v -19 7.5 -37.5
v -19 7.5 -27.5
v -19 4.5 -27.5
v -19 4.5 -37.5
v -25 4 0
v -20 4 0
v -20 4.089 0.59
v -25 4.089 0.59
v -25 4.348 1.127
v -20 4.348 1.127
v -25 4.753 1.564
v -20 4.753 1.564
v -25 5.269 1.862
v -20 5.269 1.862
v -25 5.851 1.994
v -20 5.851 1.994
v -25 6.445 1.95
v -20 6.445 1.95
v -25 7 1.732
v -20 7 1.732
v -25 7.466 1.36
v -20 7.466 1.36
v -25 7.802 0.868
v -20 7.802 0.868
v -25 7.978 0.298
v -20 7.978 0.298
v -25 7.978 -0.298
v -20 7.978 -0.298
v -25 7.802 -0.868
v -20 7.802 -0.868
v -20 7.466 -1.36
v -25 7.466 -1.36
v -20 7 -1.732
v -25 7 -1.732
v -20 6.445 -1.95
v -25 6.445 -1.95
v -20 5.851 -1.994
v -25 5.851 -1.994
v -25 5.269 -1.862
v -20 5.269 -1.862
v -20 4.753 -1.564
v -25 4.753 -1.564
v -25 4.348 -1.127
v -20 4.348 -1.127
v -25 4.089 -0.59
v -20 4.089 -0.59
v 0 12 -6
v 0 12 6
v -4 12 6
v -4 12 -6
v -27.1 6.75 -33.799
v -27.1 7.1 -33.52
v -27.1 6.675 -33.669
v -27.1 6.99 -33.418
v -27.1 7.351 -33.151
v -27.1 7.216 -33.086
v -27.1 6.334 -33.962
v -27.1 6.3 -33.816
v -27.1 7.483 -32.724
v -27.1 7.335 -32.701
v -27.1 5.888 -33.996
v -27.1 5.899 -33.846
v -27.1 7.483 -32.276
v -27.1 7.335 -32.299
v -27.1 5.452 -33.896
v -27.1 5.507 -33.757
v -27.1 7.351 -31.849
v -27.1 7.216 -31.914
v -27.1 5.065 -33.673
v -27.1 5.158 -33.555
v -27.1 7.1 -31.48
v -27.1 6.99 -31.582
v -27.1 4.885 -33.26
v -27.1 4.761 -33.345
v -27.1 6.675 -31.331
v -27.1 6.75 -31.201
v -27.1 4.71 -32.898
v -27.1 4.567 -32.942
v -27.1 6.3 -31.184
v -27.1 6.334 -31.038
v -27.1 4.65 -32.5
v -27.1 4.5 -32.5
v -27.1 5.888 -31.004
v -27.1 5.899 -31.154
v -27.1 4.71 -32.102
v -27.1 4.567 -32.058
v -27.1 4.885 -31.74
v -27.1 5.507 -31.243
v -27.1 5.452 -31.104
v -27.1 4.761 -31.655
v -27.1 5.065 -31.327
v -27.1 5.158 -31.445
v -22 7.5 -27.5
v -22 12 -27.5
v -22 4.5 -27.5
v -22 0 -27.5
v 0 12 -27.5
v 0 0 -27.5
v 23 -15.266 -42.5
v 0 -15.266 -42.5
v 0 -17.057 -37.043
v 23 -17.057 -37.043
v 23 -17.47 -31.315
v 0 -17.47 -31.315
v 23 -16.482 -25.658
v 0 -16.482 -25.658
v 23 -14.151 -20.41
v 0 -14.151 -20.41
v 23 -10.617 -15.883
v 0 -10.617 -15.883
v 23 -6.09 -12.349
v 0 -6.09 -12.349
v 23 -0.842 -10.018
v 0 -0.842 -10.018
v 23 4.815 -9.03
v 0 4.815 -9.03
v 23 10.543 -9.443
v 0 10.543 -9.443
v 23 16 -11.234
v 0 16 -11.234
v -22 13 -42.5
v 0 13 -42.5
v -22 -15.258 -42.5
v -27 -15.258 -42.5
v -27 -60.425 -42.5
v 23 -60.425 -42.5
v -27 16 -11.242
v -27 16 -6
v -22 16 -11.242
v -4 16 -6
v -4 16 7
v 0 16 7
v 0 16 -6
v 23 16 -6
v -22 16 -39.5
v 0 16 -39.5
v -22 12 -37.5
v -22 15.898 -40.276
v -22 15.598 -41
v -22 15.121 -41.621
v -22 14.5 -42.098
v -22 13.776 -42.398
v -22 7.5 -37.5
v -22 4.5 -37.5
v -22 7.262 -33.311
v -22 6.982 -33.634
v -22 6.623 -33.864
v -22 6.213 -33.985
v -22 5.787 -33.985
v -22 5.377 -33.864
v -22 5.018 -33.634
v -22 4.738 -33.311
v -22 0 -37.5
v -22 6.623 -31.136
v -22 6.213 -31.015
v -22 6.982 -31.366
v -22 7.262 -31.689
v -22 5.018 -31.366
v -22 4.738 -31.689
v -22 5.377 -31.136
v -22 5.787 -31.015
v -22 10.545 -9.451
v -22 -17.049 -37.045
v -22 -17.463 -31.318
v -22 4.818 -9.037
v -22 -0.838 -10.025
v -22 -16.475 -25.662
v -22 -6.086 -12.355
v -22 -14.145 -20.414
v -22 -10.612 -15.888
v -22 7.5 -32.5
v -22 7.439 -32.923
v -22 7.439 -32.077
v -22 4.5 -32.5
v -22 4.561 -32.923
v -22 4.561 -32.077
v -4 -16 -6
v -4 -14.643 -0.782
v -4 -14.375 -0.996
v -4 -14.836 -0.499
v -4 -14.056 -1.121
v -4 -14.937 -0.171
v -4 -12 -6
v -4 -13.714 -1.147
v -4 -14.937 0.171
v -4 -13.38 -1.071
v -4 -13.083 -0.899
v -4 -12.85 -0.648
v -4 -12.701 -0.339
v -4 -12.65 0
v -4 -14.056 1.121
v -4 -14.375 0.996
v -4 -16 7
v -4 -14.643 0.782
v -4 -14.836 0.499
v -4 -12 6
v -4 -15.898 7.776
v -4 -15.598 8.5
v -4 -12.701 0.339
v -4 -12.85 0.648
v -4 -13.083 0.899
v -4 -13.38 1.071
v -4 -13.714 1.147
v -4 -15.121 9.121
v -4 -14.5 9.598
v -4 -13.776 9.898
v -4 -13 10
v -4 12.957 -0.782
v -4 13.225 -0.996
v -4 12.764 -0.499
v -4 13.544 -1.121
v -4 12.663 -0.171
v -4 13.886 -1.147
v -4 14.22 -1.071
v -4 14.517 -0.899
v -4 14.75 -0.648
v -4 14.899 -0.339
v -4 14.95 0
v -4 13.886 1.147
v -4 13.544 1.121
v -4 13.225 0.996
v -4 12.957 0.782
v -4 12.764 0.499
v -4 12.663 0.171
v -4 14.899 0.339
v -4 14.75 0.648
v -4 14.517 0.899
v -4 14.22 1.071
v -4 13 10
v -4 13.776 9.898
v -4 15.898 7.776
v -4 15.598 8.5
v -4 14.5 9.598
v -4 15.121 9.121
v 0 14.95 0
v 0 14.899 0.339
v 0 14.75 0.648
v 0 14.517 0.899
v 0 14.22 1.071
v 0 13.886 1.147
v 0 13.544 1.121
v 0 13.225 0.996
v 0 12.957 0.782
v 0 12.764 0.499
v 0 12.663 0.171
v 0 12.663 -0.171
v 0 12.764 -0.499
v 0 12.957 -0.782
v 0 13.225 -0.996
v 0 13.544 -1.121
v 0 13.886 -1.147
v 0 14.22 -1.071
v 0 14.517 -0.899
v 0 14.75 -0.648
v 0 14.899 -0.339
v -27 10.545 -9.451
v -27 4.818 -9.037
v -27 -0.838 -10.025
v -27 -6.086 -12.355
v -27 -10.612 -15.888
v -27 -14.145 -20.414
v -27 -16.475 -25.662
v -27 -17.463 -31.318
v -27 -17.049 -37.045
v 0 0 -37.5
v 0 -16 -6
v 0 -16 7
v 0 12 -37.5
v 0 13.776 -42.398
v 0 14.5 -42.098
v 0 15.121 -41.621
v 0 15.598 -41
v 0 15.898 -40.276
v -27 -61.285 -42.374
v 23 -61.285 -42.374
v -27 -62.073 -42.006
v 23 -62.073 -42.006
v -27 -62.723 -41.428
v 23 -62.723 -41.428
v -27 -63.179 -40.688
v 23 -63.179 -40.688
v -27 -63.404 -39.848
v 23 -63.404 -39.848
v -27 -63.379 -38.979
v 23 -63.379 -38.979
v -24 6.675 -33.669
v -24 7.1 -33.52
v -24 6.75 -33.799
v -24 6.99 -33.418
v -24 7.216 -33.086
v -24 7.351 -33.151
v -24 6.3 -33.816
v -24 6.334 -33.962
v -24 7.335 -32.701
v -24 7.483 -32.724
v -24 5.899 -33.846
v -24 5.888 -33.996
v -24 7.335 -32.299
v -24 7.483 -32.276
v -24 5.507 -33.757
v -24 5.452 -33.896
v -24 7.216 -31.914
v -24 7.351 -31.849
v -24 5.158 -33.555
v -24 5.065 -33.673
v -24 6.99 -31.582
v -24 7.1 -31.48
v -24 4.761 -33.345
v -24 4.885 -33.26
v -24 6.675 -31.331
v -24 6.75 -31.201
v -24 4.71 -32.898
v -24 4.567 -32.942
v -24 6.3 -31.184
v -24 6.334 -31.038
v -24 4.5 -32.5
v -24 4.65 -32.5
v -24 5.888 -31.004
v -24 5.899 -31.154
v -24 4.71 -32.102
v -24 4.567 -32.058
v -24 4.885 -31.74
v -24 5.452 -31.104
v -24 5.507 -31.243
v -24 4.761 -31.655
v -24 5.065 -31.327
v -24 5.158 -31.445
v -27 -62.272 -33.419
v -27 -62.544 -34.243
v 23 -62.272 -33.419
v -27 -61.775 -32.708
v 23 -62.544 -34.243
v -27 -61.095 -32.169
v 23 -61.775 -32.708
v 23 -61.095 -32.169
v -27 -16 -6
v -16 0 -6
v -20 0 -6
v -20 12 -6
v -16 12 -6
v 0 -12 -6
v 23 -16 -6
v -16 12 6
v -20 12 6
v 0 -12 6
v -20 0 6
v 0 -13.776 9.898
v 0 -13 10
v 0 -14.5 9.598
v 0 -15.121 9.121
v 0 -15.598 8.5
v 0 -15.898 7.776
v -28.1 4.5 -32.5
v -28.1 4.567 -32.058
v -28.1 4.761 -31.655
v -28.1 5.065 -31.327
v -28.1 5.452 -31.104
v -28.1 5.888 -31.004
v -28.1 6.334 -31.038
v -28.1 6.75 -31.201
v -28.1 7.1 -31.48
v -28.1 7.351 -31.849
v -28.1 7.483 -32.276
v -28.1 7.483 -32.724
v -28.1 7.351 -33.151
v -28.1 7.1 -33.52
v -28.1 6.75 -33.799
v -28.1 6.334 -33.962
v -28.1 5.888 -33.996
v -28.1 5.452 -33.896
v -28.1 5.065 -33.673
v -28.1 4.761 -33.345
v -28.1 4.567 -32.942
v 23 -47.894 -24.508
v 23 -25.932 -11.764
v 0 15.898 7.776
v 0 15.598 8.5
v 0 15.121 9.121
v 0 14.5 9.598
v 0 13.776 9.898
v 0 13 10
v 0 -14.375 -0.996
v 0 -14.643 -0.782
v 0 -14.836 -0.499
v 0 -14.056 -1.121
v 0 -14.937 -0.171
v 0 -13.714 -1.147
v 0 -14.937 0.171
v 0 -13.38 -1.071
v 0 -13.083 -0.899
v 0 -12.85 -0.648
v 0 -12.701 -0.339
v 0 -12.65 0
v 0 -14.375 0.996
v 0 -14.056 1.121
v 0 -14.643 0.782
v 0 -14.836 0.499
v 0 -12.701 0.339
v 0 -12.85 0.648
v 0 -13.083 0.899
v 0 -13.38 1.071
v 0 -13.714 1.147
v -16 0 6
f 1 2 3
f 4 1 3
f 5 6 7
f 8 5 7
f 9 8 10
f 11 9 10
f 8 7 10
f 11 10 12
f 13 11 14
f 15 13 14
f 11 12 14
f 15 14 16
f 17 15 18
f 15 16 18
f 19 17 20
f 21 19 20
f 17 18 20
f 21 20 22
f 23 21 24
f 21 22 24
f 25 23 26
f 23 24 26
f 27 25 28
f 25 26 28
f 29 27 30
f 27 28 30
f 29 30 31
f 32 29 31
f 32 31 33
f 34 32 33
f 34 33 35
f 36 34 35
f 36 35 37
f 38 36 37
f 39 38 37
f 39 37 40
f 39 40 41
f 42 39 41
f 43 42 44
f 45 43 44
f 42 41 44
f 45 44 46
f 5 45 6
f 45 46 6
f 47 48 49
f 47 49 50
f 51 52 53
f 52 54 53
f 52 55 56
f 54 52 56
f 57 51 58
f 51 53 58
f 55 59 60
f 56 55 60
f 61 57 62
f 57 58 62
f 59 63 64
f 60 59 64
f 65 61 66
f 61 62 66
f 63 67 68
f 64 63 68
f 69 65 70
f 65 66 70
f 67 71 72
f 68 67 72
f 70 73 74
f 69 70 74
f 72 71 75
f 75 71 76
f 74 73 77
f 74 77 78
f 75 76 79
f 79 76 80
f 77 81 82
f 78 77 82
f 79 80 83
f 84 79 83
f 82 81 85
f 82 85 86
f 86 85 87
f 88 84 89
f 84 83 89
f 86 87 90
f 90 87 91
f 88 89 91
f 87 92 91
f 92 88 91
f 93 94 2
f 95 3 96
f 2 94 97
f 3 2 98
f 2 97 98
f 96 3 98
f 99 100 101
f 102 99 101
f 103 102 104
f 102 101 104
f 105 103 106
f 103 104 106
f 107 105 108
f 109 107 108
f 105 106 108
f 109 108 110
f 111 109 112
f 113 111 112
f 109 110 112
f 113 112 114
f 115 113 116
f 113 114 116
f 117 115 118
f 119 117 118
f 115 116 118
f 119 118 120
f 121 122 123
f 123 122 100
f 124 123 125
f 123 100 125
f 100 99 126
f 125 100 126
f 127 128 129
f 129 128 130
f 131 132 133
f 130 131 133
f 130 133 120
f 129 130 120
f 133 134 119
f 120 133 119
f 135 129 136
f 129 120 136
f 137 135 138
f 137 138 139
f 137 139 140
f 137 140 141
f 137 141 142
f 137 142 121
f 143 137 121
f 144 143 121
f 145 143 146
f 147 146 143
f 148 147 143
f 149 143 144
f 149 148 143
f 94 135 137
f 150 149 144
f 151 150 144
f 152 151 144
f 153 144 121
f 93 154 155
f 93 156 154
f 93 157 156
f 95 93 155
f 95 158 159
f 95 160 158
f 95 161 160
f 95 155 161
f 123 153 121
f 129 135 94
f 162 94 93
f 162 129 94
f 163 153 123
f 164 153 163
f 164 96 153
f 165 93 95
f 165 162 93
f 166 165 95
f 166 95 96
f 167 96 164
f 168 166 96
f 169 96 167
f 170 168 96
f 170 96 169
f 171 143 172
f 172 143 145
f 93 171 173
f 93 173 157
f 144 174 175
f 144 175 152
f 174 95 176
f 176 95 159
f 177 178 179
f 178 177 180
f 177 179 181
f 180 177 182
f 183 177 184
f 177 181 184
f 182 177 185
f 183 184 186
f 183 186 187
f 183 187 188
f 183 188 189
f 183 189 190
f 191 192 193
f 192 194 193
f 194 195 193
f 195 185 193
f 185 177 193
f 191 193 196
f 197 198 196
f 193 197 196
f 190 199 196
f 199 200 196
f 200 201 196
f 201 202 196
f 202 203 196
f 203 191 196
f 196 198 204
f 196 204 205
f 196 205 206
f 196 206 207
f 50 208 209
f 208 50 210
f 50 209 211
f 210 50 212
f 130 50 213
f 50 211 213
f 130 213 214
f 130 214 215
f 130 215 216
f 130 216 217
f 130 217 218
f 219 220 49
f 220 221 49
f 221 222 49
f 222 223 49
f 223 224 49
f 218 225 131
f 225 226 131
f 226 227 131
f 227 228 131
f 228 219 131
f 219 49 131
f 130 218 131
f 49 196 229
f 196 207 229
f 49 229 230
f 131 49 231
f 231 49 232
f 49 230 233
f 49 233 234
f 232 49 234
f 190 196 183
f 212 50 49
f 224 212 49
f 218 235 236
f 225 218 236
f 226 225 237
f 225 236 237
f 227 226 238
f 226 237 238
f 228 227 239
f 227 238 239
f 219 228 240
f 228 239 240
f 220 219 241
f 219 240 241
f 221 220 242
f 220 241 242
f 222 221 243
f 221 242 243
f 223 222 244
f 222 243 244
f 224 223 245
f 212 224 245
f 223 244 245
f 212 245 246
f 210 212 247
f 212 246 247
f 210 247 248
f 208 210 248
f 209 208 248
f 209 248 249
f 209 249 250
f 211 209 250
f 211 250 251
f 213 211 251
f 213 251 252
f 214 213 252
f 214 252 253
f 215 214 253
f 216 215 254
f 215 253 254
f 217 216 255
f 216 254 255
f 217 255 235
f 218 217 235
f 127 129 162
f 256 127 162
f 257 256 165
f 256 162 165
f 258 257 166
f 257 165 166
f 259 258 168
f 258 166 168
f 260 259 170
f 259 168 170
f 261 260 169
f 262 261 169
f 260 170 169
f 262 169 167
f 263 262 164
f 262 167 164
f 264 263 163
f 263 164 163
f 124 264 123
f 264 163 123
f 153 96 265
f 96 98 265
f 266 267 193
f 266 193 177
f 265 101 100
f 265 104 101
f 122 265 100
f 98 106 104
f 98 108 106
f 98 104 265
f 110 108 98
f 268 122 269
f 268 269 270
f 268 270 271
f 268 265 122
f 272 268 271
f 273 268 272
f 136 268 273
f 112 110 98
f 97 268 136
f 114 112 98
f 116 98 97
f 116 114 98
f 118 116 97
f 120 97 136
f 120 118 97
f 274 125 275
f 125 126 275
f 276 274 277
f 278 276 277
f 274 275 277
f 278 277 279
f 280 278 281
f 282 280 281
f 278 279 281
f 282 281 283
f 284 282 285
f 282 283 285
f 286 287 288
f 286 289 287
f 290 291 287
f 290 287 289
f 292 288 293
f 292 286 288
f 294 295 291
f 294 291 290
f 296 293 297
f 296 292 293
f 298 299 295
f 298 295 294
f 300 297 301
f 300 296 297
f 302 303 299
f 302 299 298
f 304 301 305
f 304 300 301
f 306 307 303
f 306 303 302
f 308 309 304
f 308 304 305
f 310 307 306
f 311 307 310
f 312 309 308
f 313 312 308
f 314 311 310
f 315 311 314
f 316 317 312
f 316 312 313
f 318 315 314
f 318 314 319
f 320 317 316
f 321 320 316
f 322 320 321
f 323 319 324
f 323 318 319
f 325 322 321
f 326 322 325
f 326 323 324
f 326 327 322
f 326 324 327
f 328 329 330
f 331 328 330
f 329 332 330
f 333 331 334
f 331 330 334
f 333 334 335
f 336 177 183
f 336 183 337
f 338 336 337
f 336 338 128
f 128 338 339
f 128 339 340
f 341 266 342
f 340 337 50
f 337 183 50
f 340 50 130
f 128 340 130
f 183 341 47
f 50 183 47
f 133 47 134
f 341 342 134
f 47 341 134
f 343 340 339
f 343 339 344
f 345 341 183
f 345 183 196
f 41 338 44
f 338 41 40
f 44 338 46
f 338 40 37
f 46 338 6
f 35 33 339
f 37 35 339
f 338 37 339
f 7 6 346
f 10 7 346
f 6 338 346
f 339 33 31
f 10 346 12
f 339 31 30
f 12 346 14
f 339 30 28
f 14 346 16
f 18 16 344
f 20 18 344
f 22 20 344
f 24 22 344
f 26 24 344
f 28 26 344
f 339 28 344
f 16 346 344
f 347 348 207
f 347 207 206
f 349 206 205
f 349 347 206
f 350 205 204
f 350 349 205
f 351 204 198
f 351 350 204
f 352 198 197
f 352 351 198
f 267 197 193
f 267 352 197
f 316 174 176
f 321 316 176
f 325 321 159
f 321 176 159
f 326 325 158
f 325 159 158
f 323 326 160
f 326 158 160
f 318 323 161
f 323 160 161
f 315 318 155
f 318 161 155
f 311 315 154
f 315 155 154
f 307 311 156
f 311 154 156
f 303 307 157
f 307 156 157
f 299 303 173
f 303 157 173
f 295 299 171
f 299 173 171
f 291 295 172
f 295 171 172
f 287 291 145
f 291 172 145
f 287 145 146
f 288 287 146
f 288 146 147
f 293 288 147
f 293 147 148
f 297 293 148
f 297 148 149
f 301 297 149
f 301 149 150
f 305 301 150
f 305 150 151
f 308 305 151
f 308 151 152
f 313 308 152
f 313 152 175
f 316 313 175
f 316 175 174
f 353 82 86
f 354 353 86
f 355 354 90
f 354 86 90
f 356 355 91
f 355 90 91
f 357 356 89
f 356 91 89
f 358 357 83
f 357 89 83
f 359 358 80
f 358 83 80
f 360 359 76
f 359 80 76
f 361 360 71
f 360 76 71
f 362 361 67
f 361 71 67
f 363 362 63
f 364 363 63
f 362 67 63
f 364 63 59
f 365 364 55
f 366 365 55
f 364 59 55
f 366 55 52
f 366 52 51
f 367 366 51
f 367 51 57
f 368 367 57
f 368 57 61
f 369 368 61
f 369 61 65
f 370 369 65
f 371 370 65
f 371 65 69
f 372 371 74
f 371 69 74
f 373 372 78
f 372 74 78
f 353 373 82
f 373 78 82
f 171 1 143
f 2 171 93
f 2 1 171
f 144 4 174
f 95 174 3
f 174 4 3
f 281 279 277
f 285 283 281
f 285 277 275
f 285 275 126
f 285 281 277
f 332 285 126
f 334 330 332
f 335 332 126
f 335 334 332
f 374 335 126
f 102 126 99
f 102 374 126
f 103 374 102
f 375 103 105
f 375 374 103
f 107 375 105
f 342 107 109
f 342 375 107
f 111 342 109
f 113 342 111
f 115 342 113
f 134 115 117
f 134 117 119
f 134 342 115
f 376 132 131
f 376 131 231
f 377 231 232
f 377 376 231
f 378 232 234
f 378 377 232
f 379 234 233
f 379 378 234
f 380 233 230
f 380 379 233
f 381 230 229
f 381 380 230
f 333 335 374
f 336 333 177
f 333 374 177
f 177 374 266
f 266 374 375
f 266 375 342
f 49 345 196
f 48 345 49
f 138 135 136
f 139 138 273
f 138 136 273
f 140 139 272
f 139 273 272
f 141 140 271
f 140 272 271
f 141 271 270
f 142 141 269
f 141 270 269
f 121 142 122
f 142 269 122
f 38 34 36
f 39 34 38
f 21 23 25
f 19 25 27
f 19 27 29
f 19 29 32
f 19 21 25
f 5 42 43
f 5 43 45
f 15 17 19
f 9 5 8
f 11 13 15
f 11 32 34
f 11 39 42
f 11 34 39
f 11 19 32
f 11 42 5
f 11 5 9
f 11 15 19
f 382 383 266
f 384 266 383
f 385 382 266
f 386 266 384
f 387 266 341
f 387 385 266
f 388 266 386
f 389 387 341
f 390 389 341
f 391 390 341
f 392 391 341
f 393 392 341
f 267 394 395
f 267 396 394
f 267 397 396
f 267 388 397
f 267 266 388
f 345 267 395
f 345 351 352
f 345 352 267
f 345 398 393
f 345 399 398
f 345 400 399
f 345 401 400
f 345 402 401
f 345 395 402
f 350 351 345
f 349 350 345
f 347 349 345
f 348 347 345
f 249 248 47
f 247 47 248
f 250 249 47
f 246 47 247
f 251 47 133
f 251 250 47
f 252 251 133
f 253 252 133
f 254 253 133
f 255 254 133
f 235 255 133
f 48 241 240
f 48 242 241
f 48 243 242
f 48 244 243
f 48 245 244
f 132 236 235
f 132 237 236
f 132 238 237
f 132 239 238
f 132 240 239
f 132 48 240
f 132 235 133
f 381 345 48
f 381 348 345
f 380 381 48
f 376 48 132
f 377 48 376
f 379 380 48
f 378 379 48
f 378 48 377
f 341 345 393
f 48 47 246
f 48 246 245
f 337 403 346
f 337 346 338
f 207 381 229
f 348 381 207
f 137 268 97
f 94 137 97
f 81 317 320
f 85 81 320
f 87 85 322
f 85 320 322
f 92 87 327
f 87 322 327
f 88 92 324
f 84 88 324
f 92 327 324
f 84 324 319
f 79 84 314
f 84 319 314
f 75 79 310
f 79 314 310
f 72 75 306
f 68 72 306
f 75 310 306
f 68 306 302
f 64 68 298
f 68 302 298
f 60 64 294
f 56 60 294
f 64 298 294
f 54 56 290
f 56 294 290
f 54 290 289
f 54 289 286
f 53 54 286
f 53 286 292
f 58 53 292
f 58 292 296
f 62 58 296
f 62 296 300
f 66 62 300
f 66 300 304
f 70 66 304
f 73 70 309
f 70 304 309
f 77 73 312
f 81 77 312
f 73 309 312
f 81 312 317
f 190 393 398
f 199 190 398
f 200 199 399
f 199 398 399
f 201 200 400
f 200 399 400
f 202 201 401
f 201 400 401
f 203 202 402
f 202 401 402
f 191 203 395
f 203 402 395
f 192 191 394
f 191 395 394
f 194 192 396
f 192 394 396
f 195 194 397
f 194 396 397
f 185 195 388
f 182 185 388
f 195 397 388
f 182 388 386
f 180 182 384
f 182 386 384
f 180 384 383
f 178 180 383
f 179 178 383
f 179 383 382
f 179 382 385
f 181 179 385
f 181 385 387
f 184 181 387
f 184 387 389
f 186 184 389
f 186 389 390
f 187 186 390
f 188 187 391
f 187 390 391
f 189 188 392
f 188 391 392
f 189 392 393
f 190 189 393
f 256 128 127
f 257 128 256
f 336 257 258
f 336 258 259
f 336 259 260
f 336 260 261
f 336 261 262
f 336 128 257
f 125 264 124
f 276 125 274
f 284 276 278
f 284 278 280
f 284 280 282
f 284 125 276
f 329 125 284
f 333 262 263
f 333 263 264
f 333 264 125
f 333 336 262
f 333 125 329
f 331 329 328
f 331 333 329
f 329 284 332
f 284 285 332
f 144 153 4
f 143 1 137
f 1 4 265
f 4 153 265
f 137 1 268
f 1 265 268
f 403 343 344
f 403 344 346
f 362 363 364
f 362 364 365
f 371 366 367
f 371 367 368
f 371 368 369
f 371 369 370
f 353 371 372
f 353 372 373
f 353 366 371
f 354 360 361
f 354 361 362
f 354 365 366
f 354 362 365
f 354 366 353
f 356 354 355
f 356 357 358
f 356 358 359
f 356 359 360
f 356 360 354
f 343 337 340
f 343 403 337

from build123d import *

# Parameters (mm, degrees)
F1_DEPTH  = 23
F0_W      = 12
F0_H      = 10
F2_DEPTH  = 19
F3_W      = 3
F3_H      = 10
F4_DEPTH  = 3
F6_DEPTH  = 2
F7_R      = 1.35
F8_DEPTH  = 3.1
F9_R      = 1.5
F9_R_2    = 1.35
F10_DEPTH = 1
F12_DEPTH = 5
F0_R      = 1.15
F13_DEPTH = 4
F16_DEPTH = 4
F17_R     = 2
F18_DEPTH = 5


with BuildPart() as f1:
    # F0 (on Right) → F1 (new body)
    with BuildSketch(Plane.YZ):
        with BuildLine():
            Line((12, -6), (-12, -6))
            Line((-12, -6), (-16, -6))
            Line((-16, -6), (-25.9322462259, -11.7637196141))
            Line((-25.9322462259, -11.7637196141), (-47.8941944105, -24.5083202449))
            Line((-47.8941944105, -24.5083202449), (-61.0953553653, -32.1690032962))
            ThreePointArc((-61.0953553653, -32.1690032962), (-62.0489693843, -33.0457447692), (-62.5440346563, -34.2428102162))
            Line((-62.5440346563, -34.2428102162), (-63.3791624813, -38.979055467))
            ThreePointArc((-63.3791624813, -38.979055467), (-62.7228725516, -41.4283628291), (-60.4247392222, -42.5))
            Line((-60.4247392222, -42.5), (-15.2661703181, -42.5))
            ThreePointArc((-15.2661703181, -42.5), (-10.6170093579, -15.8829906421), (16, -11.2338296819))
            Line((16, -11.2338296819), (16, -6))
            Line((16, -6), (12, -6))
        make_face()
    extrude(amount=F1_DEPTH)

    # F0 (on Right) → F2 (join)
    with BuildSketch(Plane.YZ):
        with BuildLine():
            Line((16, -39.5), (16, -11.2338296819))
            ThreePointArc((16, -11.2338296819), (-10.6170093579, -15.8829906421), (-15.2661703181, -42.5))
            Line((-15.2661703181, -42.5), (13, -42.5))
            ThreePointArc((13, -42.5), (15.1213203436, -41.6213203436), (16, -39.5))
        make_face()
        with Locations((6, -32.5)):
            Rectangle(F0_W, F0_H, mode=Mode.SUBTRACT)
        with BuildLine():
            Line((12, -6), (-12, -6))
            Line((-12, -6), (-16, -6))
            Line((-16, -6), (-25.9322462259, -11.7637196141))
            Line((-25.9322462259, -11.7637196141), (-47.8941944105, -24.5083202449))
            Line((-47.8941944105, -24.5083202449), (-61.0953553653, -32.1690032962))
            ThreePointArc((-61.0953553653, -32.1690032962), (-62.0489693843, -33.0457447692), (-62.5440346563, -34.2428102162))
            Line((-62.5440346563, -34.2428102162), (-63.3791624813, -38.979055467))
            ThreePointArc((-63.3791624813, -38.979055467), (-62.7228725516, -41.4283628291), (-60.4247392222, -42.5))
            Line((-60.4247392222, -42.5), (-15.2661703181, -42.5))
            ThreePointArc((-15.2661703181, -42.5), (-10.6170093579, -15.8829906421), (16, -11.2338296819))
            Line((16, -11.2338296819), (16, -6))
            Line((16, -6), (12, -6))
        make_face()
    extrude(amount=-F2_DEPTH)

    # F3 (on face) → F4 (join)
    with BuildSketch(Plane(origin=(-19, 0, 0), x_dir=(0, -1, 0), z_dir=(-1, 0, 0))):
        with BuildLine():
            Line((-16, -6), (-16, -39.5))
            ThreePointArc((-16, -39.5), (-15.1213203436, -41.6213203436), (-13, -42.5))
            Line((-13, -42.5), (60.4247392222, -42.5))
            ThreePointArc((60.4247392222, -42.5), (62.7228725516, -41.4283628291), (63.3791624813, -38.979055467))
            Line((63.3791624813, -38.979055467), (62.5440346563, -34.2428102162))
            ThreePointArc((62.5440346563, -34.2428102162), (62.0489693843, -33.0457447692), (61.0953553653, -32.1690032962))
            Line((61.0953553653, -32.1690032962), (16, -6))
            Line((16, -6), (-16, -6))
        make_face()
        Polygon((-12, -27.5), (-7.5, -27.5), (-4.5, -27.5), (0, -27.5), (0, -37.5), (-4.5, -37.5), (-7.5, -37.5), (-12, -37.5), align=None, mode=Mode.SUBTRACT)
        with Locations((-6, -32.5)):
            Rectangle(F3_W, F3_H)
    extrude(amount=F4_DEPTH)

    # F5 (on face) → F6 (join)
    with BuildSketch(Plane(origin=(-22, 0, 0), x_dir=(0, -1, 0), z_dir=(-1, 0, 0))):
        with BuildLine():
            ThreePointArc((-7.5, -32.5), (-6, -34), (-4.5, -32.5))
            ThreePointArc((-4.5, -32.5), (-6, -31), (-7.5, -32.5))
        make_face()
    extrude(amount=F6_DEPTH)

    # F7 (on face) → F8 (join)
    with BuildSketch(Plane(origin=(-24, 0, 0), x_dir=(0, -1, 0), z_dir=(-1, 0, 0))):
        with Locations((-6, -32.5)):
            Circle(F7_R)
    extrude(amount=F8_DEPTH)

    # F9 (on face) → F10 (join)
    with BuildSketch(Plane(origin=(-27.1, 0, 0), x_dir=(0, -1, 0), z_dir=(-1, 0, 0))):
        with Locations((-6, -32.5)):
            Circle(F9_R)
        with Locations((-6, -32.5)):
            Circle(F9_R_2, mode=Mode.SUBTRACT)
        with Locations((-6, -32.5)):
            Circle(F9_R_2)
    extrude(amount=F10_DEPTH)

    # F11 (on face) → F12 (join)
    with BuildSketch(Plane(origin=(-22, 0, 0), x_dir=(0, -1, 0), z_dir=(-1, 0, 0))):
        with BuildLine():
            ThreePointArc((-16, -11.2419736034), (10.6117983114, -15.8882016886), (15.2580263966, -42.5))
            Line((15.2580263966, -42.5), (60.4247392222, -42.5))
            ThreePointArc((60.4247392222, -42.5), (62.7228725516, -41.4283628291), (63.3791624813, -38.979055467))
            Line((63.3791624813, -38.979055467), (62.5440346563, -34.2428102162))
            ThreePointArc((62.5440346563, -34.2428102162), (62.0489693843, -33.0457447692), (61.0953553653, -32.1690032962))
            Line((61.0953553653, -32.1690032962), (16, -6))
            Line((16, -6), (-16, -6))
            Line((-16, -6), (-16, -11.2419736034))
        make_face()
    extrude(amount=F12_DEPTH)

    # F0 (on Right) → F13 (join)
    with BuildSketch(Plane.YZ):
        with BuildLine():
            Line((-12, -6), (-12, 6))
            Line((-12, 6), (12, 6))
            Line((12, 6), (12, -6))
            Line((12, -6), (16, -6))
            Line((16, -6), (16, 7))
            ThreePointArc((16, 7), (15.1213203436, 9.1213203436), (13, 10))
            Line((13, 10), (0, 10))
            Line((0, 10), (-13, 10))
            ThreePointArc((-13, 10), (-15.1213203436, 9.1213203436), (-16, 7))
            Line((-16, 7), (-16, -6))
            Line((-16, -6), (-12, -6))
        make_face()
        with Locations((-13.8, 0)):
            Circle(F0_R, mode=Mode.SUBTRACT)
        with Locations((13.8, 0)):
            Circle(F0_R, mode=Mode.SUBTRACT)
    extrude(amount=-F13_DEPTH)

    # F15 (on offset) → F16 (join)
    with BuildSketch(Plane.YZ.offset(-16)):
        Polygon((0, -6), (12, -6), (12, 0), (12, 6), (0, 6), align=None)
    extrude(amount=-F16_DEPTH)

    # F17 (on face) → F18 (join)
    with BuildSketch(Plane(origin=(-20, 0, 0), x_dir=(0, -1, 0), z_dir=(-1, 0, 0))):
        with Locations((-6, 0)):
            Circle(F17_R)
    extrude(amount=F18_DEPTH)


solid = f1.part
